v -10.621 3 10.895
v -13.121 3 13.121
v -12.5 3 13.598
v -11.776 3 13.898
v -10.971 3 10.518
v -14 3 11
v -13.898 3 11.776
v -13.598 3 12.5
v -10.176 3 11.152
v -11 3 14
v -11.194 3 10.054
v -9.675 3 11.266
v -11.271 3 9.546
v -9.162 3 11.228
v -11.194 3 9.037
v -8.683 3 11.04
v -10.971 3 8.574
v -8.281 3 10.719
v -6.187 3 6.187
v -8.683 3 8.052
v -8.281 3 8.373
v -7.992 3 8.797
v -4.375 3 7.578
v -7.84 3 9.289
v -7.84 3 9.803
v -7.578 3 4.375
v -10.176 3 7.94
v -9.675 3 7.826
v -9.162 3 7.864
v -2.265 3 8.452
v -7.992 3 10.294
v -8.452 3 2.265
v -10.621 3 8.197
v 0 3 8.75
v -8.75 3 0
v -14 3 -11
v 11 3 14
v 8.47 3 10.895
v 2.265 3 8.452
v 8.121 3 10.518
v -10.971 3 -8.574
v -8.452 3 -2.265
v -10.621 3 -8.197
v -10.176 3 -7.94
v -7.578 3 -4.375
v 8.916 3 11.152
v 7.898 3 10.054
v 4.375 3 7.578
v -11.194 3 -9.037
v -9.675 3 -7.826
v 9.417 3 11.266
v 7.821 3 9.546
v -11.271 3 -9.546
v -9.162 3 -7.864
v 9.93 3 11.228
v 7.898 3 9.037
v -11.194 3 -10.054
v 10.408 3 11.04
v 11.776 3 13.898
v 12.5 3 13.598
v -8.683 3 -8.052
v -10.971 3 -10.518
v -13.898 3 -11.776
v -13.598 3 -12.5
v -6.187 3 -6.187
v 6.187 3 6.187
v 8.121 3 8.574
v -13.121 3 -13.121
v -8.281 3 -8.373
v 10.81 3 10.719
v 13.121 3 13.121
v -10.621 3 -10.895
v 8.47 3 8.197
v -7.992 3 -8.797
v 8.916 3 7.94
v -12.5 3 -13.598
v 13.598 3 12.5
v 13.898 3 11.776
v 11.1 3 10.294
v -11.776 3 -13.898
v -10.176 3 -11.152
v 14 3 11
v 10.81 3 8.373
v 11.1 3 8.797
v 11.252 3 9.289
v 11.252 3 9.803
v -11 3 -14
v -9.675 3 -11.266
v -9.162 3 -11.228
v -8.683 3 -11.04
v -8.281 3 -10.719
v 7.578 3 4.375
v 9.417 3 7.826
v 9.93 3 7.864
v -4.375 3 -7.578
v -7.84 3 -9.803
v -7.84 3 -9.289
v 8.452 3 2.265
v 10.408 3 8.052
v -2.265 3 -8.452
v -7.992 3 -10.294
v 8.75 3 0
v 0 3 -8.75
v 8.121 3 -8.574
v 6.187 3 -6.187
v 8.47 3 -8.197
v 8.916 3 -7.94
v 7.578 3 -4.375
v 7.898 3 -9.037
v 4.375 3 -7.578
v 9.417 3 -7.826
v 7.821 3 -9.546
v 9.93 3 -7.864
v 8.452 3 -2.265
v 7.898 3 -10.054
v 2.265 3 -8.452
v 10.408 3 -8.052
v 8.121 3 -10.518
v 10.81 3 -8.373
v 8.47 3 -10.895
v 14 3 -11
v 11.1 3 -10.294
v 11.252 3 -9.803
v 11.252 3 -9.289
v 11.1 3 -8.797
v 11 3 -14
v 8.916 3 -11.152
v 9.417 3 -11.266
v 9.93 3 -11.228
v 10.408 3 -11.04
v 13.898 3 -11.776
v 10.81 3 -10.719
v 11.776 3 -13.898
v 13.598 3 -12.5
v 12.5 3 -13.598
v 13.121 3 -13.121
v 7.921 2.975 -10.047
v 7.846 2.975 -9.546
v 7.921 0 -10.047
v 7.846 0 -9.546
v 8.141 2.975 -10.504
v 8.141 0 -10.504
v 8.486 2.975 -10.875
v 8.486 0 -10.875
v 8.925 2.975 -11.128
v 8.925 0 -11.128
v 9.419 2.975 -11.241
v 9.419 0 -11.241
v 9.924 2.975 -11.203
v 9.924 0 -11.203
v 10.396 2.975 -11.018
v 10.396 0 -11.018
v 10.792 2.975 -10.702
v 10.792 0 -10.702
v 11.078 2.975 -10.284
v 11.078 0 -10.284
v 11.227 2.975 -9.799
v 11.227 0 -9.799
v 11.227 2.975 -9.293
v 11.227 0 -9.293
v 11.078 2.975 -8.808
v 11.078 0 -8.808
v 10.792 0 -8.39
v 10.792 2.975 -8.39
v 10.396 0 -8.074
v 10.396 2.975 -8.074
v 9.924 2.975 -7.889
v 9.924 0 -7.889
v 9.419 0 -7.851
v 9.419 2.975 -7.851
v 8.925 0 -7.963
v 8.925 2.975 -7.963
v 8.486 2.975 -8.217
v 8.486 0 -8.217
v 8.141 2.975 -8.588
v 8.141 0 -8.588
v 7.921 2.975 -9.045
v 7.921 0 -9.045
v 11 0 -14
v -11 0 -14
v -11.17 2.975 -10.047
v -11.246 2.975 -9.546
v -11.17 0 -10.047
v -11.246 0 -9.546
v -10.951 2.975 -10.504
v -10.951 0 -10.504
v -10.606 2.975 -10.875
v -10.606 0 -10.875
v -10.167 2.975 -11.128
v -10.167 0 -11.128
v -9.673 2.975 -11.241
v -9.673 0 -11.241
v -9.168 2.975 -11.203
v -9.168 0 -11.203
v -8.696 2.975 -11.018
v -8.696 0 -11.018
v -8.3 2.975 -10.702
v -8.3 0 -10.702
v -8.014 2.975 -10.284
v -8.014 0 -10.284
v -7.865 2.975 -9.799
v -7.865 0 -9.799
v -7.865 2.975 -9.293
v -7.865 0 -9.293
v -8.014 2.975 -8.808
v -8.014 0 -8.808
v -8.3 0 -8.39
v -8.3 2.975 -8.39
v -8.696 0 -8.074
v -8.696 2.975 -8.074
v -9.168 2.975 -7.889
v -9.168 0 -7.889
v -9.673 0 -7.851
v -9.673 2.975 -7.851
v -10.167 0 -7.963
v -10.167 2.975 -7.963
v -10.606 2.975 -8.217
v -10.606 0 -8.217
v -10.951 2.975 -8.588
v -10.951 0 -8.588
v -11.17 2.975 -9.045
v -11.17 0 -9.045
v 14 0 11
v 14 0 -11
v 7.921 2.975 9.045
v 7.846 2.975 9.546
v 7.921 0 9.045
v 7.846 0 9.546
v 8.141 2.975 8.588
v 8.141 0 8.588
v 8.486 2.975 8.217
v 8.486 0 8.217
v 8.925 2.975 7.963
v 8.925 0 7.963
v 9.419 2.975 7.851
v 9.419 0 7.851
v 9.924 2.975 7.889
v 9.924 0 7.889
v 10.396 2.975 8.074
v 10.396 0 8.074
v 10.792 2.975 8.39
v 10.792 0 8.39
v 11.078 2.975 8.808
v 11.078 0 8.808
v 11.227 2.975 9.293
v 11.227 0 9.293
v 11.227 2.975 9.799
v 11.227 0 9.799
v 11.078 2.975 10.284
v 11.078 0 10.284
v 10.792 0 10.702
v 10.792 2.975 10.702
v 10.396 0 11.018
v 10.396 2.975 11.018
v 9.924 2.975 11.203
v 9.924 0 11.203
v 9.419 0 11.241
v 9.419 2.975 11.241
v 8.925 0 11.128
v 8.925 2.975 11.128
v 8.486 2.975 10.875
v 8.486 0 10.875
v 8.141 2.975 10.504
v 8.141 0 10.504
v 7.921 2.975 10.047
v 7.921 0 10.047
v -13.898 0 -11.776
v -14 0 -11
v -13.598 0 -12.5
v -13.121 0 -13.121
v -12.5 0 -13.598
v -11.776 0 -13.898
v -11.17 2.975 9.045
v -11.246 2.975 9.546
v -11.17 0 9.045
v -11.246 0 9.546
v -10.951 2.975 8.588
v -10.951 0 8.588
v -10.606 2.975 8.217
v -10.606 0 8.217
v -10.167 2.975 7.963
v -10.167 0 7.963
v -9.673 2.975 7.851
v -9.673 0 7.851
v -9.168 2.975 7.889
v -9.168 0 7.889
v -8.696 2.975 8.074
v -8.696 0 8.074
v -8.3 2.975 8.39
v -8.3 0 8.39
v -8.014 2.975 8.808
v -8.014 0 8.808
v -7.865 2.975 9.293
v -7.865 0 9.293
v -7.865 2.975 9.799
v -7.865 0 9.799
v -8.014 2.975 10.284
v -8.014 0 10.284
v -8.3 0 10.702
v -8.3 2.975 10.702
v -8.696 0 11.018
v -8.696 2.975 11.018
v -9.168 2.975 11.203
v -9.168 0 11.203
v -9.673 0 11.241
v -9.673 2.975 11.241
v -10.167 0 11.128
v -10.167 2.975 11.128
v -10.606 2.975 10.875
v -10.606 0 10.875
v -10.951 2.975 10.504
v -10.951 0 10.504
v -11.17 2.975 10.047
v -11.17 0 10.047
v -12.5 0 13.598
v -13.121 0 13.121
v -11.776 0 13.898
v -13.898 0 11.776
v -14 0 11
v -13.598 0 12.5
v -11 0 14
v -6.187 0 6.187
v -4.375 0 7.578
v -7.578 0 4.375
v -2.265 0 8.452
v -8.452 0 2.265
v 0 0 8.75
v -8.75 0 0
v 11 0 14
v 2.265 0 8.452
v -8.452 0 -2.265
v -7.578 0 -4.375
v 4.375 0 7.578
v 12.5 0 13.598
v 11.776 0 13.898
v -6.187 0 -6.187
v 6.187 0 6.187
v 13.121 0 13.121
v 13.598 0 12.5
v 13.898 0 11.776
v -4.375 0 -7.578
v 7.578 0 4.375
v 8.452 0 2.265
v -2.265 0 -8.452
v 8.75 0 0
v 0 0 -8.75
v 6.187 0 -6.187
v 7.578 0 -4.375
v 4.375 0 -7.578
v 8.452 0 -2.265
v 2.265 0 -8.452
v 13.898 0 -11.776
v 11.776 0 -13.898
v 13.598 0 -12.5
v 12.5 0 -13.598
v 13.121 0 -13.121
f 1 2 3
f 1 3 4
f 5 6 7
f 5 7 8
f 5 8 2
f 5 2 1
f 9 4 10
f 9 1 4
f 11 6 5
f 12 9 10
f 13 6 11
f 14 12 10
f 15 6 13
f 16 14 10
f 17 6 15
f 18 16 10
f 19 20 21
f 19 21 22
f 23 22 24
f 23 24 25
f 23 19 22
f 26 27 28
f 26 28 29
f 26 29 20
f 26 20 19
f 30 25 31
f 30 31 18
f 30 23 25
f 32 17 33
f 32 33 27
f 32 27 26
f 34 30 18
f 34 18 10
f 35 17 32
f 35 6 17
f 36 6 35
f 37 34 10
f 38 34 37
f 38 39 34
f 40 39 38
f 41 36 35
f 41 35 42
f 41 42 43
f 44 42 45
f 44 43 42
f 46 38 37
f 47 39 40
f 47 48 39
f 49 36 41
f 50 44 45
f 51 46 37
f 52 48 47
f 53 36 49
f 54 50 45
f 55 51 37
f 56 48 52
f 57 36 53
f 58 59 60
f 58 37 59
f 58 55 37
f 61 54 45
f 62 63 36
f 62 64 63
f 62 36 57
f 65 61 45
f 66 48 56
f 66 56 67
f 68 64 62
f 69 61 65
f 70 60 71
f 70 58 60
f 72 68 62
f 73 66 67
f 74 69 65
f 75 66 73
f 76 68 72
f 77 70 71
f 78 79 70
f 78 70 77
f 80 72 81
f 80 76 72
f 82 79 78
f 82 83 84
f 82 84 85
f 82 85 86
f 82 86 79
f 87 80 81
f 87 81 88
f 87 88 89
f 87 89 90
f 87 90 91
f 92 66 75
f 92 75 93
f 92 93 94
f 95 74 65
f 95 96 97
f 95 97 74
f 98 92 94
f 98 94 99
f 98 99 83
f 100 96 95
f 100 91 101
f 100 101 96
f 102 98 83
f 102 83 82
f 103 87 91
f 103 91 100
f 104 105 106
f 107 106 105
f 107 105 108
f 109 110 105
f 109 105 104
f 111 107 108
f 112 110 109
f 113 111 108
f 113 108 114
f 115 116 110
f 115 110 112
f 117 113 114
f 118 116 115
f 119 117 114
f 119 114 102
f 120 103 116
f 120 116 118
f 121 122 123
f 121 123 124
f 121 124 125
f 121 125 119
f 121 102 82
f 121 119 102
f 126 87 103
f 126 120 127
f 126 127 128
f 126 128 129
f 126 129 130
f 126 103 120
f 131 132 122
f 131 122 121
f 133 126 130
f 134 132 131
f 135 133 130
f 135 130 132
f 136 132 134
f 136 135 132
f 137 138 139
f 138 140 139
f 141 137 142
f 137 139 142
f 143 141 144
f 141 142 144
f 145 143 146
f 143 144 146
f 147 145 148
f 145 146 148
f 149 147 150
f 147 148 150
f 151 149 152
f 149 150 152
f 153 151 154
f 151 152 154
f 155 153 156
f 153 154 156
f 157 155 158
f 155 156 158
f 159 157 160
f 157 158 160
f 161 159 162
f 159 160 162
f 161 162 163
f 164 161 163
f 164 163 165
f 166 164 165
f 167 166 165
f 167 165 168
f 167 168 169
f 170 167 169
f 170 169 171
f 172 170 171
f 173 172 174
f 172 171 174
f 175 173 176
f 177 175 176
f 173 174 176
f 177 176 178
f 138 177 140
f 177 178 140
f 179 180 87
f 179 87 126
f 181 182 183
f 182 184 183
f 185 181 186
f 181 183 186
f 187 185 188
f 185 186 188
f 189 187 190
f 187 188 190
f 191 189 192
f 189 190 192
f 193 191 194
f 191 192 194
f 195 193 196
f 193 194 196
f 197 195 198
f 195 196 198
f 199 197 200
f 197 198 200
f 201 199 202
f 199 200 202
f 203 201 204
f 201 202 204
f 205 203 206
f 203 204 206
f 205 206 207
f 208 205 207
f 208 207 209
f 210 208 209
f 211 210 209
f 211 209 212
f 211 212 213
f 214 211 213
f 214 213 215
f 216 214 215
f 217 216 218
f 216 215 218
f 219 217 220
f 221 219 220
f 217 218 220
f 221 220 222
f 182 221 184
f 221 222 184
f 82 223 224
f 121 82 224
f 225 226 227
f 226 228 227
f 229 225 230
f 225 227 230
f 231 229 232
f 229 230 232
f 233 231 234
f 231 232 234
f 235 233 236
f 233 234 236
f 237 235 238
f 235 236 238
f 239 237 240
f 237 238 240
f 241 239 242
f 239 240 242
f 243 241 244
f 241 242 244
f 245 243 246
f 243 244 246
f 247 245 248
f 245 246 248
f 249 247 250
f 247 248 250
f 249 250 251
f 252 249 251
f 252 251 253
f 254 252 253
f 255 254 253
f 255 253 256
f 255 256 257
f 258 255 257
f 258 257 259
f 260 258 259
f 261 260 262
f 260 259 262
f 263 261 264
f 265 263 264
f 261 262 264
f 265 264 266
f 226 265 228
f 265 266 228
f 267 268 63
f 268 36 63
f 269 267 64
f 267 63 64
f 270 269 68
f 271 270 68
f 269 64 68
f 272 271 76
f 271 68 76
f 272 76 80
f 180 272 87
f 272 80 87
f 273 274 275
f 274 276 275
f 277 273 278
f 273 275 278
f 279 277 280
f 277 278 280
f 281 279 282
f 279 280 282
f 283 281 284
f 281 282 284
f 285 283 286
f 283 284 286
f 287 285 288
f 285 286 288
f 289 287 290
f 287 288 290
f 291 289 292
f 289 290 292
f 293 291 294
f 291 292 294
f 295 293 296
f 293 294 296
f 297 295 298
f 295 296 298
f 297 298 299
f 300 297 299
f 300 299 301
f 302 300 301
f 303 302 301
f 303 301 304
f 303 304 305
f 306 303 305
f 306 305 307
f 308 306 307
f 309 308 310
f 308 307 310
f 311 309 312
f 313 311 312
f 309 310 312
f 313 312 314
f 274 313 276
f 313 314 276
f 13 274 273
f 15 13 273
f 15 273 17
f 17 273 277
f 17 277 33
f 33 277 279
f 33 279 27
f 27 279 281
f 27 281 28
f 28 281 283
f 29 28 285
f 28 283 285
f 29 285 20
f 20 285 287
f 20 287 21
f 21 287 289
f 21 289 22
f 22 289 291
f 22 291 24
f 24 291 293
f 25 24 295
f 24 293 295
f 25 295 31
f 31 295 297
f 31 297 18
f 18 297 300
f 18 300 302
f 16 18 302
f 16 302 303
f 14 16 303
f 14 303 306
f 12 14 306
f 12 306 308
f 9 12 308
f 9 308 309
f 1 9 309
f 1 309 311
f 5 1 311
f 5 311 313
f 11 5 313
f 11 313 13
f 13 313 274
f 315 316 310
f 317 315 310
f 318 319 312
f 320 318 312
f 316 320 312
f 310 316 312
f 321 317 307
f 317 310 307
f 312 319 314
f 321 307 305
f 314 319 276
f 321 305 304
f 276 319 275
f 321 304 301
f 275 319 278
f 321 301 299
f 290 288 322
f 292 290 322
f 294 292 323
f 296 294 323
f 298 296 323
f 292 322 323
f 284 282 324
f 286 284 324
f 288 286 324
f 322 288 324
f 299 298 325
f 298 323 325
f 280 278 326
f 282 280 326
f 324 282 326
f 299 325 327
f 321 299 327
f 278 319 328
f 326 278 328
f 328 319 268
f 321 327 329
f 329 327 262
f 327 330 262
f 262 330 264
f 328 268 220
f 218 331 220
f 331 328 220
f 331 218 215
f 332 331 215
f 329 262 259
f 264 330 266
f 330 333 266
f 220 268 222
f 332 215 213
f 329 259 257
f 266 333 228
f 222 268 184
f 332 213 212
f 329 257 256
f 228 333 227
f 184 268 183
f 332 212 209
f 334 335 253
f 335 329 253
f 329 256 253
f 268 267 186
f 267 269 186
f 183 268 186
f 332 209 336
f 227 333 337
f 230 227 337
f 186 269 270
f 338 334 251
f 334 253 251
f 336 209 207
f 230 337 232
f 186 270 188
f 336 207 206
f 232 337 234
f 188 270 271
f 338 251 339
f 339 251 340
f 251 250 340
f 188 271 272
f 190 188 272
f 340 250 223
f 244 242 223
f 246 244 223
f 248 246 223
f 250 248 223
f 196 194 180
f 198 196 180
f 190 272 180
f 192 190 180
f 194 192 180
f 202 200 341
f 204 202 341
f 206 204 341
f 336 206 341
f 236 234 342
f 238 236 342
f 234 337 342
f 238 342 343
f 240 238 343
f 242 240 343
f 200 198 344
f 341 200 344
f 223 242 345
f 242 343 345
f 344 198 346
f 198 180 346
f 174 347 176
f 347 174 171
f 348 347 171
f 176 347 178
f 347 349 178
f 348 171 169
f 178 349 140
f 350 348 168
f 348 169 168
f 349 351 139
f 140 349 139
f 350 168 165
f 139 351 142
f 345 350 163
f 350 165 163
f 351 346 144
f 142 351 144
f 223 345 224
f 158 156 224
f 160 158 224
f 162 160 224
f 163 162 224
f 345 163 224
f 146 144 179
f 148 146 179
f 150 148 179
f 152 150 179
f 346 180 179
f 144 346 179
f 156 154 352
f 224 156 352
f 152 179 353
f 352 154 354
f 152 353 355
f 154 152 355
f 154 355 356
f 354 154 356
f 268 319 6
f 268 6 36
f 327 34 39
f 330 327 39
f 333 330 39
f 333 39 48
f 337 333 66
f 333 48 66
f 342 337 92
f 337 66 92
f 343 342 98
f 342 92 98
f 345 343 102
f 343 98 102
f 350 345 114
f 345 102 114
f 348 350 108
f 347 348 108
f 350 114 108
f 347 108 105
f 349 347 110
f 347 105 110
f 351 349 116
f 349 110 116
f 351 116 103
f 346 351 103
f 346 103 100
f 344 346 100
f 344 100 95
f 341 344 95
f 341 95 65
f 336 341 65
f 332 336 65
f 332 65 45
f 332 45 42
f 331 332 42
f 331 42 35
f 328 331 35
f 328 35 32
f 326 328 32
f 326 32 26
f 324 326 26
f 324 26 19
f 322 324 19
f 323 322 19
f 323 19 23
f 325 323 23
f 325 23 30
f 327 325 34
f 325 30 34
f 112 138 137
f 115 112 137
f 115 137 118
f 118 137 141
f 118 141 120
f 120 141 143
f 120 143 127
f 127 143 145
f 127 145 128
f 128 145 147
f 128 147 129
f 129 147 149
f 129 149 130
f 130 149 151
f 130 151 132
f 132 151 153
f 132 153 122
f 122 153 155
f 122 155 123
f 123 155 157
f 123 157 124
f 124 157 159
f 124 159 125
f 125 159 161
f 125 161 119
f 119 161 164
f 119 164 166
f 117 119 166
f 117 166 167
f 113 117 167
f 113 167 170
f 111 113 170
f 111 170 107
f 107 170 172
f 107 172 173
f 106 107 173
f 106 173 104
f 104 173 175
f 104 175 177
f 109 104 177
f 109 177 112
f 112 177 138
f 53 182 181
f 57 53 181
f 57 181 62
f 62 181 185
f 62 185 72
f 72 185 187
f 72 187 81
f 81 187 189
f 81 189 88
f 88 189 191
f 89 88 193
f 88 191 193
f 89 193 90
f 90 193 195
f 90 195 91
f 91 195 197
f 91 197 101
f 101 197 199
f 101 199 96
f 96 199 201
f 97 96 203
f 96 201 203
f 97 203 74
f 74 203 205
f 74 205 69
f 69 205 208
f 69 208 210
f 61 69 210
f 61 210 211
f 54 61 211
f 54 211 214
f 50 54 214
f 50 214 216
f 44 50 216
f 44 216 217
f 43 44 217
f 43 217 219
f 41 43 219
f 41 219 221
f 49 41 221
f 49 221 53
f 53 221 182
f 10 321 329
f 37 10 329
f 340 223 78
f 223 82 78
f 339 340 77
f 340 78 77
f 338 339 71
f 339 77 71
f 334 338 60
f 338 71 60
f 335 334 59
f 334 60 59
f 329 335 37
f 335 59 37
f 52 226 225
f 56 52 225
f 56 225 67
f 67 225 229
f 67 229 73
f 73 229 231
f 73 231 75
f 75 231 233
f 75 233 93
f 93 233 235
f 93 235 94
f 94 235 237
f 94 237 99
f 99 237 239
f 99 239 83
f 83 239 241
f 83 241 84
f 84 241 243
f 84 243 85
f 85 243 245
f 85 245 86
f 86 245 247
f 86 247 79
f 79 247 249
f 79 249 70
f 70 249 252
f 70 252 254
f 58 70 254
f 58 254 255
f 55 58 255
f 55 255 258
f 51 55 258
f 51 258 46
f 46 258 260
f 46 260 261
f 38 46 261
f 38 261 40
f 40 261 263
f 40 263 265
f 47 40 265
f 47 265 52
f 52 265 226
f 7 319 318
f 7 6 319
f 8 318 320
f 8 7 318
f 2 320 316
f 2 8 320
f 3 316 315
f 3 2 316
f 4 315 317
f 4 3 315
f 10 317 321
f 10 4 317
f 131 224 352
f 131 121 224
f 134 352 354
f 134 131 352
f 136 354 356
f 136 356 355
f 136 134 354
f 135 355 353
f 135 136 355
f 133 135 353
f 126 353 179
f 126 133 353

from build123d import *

# Parameters (mm, degrees)
SKETCH1_W                      = 28
SKETCH1_H                      = 28
BOSS_EXTRUDE1_DEPTH            = 3
SKETCH2_R                      = 8.75
CUT_EXTRUDE1_DEPTH             = 21.024984395
M3_CLEARANCE_HOLE1_D           = 3.4
M3_CLEARANCE_HOLE1_CSINK_D     = 3.45
M3_CLEARANCE_HOLE1_CSINK_ANGLE = 90
FILLET1_R                      = 3


with BuildPart() as part:
    # Sketch1 → Boss-Extrude1 (new body)
    with BuildSketch(Plane(origin=(0, 0, 0), x_dir=(1, 0, 0), z_dir=(0, 1, 0))):
        Rectangle(SKETCH1_W, SKETCH1_H)
    extrude(amount=BOSS_EXTRUDE1_DEPTH)

    # Sketch2 → Cut-Extrude1 (cut, through all)
    with BuildSketch(Plane(origin=(0, 3, 0), x_dir=(1, 0, 0), z_dir=(0, 1, 0))):
        with Locations(Location((0, 0, 0), (0, 0, 270))):
            Circle(SKETCH2_R)
    extrude(amount=-CUT_EXTRUDE1_DEPTH, mode=Mode.SUBTRACT)

    # M3 Clearance Hole1 (through all)
    with Locations(Plane(origin=(0, 3, 0), x_dir=(1, 0, 0), z_dir=(0, 1, 0))):
        with Locations((-9.545941546, 9.545941546), (9.545941546, 9.545941546), (9.545941546, -9.545941546), (-9.545941546, -9.545941546)):
            CounterSinkHole(M3_CLEARANCE_HOLE1_D / 2, M3_CLEARANCE_HOLE1_CSINK_D / 2, counter_sink_angle=M3_CLEARANCE_HOLE1_CSINK_ANGLE)

    # Fillet1
    fillet1_edges = [part.edges().sort_by_distance(p)[0] for p in [
        (-14, 1.5, -14),
        (14, 1.5, -14),
        (14, 1.5, 14),
        (-14, 1.5, 14),
    ]]
    fillet(fillet1_edges, radius=FILLET1_R)


solid = part.part
